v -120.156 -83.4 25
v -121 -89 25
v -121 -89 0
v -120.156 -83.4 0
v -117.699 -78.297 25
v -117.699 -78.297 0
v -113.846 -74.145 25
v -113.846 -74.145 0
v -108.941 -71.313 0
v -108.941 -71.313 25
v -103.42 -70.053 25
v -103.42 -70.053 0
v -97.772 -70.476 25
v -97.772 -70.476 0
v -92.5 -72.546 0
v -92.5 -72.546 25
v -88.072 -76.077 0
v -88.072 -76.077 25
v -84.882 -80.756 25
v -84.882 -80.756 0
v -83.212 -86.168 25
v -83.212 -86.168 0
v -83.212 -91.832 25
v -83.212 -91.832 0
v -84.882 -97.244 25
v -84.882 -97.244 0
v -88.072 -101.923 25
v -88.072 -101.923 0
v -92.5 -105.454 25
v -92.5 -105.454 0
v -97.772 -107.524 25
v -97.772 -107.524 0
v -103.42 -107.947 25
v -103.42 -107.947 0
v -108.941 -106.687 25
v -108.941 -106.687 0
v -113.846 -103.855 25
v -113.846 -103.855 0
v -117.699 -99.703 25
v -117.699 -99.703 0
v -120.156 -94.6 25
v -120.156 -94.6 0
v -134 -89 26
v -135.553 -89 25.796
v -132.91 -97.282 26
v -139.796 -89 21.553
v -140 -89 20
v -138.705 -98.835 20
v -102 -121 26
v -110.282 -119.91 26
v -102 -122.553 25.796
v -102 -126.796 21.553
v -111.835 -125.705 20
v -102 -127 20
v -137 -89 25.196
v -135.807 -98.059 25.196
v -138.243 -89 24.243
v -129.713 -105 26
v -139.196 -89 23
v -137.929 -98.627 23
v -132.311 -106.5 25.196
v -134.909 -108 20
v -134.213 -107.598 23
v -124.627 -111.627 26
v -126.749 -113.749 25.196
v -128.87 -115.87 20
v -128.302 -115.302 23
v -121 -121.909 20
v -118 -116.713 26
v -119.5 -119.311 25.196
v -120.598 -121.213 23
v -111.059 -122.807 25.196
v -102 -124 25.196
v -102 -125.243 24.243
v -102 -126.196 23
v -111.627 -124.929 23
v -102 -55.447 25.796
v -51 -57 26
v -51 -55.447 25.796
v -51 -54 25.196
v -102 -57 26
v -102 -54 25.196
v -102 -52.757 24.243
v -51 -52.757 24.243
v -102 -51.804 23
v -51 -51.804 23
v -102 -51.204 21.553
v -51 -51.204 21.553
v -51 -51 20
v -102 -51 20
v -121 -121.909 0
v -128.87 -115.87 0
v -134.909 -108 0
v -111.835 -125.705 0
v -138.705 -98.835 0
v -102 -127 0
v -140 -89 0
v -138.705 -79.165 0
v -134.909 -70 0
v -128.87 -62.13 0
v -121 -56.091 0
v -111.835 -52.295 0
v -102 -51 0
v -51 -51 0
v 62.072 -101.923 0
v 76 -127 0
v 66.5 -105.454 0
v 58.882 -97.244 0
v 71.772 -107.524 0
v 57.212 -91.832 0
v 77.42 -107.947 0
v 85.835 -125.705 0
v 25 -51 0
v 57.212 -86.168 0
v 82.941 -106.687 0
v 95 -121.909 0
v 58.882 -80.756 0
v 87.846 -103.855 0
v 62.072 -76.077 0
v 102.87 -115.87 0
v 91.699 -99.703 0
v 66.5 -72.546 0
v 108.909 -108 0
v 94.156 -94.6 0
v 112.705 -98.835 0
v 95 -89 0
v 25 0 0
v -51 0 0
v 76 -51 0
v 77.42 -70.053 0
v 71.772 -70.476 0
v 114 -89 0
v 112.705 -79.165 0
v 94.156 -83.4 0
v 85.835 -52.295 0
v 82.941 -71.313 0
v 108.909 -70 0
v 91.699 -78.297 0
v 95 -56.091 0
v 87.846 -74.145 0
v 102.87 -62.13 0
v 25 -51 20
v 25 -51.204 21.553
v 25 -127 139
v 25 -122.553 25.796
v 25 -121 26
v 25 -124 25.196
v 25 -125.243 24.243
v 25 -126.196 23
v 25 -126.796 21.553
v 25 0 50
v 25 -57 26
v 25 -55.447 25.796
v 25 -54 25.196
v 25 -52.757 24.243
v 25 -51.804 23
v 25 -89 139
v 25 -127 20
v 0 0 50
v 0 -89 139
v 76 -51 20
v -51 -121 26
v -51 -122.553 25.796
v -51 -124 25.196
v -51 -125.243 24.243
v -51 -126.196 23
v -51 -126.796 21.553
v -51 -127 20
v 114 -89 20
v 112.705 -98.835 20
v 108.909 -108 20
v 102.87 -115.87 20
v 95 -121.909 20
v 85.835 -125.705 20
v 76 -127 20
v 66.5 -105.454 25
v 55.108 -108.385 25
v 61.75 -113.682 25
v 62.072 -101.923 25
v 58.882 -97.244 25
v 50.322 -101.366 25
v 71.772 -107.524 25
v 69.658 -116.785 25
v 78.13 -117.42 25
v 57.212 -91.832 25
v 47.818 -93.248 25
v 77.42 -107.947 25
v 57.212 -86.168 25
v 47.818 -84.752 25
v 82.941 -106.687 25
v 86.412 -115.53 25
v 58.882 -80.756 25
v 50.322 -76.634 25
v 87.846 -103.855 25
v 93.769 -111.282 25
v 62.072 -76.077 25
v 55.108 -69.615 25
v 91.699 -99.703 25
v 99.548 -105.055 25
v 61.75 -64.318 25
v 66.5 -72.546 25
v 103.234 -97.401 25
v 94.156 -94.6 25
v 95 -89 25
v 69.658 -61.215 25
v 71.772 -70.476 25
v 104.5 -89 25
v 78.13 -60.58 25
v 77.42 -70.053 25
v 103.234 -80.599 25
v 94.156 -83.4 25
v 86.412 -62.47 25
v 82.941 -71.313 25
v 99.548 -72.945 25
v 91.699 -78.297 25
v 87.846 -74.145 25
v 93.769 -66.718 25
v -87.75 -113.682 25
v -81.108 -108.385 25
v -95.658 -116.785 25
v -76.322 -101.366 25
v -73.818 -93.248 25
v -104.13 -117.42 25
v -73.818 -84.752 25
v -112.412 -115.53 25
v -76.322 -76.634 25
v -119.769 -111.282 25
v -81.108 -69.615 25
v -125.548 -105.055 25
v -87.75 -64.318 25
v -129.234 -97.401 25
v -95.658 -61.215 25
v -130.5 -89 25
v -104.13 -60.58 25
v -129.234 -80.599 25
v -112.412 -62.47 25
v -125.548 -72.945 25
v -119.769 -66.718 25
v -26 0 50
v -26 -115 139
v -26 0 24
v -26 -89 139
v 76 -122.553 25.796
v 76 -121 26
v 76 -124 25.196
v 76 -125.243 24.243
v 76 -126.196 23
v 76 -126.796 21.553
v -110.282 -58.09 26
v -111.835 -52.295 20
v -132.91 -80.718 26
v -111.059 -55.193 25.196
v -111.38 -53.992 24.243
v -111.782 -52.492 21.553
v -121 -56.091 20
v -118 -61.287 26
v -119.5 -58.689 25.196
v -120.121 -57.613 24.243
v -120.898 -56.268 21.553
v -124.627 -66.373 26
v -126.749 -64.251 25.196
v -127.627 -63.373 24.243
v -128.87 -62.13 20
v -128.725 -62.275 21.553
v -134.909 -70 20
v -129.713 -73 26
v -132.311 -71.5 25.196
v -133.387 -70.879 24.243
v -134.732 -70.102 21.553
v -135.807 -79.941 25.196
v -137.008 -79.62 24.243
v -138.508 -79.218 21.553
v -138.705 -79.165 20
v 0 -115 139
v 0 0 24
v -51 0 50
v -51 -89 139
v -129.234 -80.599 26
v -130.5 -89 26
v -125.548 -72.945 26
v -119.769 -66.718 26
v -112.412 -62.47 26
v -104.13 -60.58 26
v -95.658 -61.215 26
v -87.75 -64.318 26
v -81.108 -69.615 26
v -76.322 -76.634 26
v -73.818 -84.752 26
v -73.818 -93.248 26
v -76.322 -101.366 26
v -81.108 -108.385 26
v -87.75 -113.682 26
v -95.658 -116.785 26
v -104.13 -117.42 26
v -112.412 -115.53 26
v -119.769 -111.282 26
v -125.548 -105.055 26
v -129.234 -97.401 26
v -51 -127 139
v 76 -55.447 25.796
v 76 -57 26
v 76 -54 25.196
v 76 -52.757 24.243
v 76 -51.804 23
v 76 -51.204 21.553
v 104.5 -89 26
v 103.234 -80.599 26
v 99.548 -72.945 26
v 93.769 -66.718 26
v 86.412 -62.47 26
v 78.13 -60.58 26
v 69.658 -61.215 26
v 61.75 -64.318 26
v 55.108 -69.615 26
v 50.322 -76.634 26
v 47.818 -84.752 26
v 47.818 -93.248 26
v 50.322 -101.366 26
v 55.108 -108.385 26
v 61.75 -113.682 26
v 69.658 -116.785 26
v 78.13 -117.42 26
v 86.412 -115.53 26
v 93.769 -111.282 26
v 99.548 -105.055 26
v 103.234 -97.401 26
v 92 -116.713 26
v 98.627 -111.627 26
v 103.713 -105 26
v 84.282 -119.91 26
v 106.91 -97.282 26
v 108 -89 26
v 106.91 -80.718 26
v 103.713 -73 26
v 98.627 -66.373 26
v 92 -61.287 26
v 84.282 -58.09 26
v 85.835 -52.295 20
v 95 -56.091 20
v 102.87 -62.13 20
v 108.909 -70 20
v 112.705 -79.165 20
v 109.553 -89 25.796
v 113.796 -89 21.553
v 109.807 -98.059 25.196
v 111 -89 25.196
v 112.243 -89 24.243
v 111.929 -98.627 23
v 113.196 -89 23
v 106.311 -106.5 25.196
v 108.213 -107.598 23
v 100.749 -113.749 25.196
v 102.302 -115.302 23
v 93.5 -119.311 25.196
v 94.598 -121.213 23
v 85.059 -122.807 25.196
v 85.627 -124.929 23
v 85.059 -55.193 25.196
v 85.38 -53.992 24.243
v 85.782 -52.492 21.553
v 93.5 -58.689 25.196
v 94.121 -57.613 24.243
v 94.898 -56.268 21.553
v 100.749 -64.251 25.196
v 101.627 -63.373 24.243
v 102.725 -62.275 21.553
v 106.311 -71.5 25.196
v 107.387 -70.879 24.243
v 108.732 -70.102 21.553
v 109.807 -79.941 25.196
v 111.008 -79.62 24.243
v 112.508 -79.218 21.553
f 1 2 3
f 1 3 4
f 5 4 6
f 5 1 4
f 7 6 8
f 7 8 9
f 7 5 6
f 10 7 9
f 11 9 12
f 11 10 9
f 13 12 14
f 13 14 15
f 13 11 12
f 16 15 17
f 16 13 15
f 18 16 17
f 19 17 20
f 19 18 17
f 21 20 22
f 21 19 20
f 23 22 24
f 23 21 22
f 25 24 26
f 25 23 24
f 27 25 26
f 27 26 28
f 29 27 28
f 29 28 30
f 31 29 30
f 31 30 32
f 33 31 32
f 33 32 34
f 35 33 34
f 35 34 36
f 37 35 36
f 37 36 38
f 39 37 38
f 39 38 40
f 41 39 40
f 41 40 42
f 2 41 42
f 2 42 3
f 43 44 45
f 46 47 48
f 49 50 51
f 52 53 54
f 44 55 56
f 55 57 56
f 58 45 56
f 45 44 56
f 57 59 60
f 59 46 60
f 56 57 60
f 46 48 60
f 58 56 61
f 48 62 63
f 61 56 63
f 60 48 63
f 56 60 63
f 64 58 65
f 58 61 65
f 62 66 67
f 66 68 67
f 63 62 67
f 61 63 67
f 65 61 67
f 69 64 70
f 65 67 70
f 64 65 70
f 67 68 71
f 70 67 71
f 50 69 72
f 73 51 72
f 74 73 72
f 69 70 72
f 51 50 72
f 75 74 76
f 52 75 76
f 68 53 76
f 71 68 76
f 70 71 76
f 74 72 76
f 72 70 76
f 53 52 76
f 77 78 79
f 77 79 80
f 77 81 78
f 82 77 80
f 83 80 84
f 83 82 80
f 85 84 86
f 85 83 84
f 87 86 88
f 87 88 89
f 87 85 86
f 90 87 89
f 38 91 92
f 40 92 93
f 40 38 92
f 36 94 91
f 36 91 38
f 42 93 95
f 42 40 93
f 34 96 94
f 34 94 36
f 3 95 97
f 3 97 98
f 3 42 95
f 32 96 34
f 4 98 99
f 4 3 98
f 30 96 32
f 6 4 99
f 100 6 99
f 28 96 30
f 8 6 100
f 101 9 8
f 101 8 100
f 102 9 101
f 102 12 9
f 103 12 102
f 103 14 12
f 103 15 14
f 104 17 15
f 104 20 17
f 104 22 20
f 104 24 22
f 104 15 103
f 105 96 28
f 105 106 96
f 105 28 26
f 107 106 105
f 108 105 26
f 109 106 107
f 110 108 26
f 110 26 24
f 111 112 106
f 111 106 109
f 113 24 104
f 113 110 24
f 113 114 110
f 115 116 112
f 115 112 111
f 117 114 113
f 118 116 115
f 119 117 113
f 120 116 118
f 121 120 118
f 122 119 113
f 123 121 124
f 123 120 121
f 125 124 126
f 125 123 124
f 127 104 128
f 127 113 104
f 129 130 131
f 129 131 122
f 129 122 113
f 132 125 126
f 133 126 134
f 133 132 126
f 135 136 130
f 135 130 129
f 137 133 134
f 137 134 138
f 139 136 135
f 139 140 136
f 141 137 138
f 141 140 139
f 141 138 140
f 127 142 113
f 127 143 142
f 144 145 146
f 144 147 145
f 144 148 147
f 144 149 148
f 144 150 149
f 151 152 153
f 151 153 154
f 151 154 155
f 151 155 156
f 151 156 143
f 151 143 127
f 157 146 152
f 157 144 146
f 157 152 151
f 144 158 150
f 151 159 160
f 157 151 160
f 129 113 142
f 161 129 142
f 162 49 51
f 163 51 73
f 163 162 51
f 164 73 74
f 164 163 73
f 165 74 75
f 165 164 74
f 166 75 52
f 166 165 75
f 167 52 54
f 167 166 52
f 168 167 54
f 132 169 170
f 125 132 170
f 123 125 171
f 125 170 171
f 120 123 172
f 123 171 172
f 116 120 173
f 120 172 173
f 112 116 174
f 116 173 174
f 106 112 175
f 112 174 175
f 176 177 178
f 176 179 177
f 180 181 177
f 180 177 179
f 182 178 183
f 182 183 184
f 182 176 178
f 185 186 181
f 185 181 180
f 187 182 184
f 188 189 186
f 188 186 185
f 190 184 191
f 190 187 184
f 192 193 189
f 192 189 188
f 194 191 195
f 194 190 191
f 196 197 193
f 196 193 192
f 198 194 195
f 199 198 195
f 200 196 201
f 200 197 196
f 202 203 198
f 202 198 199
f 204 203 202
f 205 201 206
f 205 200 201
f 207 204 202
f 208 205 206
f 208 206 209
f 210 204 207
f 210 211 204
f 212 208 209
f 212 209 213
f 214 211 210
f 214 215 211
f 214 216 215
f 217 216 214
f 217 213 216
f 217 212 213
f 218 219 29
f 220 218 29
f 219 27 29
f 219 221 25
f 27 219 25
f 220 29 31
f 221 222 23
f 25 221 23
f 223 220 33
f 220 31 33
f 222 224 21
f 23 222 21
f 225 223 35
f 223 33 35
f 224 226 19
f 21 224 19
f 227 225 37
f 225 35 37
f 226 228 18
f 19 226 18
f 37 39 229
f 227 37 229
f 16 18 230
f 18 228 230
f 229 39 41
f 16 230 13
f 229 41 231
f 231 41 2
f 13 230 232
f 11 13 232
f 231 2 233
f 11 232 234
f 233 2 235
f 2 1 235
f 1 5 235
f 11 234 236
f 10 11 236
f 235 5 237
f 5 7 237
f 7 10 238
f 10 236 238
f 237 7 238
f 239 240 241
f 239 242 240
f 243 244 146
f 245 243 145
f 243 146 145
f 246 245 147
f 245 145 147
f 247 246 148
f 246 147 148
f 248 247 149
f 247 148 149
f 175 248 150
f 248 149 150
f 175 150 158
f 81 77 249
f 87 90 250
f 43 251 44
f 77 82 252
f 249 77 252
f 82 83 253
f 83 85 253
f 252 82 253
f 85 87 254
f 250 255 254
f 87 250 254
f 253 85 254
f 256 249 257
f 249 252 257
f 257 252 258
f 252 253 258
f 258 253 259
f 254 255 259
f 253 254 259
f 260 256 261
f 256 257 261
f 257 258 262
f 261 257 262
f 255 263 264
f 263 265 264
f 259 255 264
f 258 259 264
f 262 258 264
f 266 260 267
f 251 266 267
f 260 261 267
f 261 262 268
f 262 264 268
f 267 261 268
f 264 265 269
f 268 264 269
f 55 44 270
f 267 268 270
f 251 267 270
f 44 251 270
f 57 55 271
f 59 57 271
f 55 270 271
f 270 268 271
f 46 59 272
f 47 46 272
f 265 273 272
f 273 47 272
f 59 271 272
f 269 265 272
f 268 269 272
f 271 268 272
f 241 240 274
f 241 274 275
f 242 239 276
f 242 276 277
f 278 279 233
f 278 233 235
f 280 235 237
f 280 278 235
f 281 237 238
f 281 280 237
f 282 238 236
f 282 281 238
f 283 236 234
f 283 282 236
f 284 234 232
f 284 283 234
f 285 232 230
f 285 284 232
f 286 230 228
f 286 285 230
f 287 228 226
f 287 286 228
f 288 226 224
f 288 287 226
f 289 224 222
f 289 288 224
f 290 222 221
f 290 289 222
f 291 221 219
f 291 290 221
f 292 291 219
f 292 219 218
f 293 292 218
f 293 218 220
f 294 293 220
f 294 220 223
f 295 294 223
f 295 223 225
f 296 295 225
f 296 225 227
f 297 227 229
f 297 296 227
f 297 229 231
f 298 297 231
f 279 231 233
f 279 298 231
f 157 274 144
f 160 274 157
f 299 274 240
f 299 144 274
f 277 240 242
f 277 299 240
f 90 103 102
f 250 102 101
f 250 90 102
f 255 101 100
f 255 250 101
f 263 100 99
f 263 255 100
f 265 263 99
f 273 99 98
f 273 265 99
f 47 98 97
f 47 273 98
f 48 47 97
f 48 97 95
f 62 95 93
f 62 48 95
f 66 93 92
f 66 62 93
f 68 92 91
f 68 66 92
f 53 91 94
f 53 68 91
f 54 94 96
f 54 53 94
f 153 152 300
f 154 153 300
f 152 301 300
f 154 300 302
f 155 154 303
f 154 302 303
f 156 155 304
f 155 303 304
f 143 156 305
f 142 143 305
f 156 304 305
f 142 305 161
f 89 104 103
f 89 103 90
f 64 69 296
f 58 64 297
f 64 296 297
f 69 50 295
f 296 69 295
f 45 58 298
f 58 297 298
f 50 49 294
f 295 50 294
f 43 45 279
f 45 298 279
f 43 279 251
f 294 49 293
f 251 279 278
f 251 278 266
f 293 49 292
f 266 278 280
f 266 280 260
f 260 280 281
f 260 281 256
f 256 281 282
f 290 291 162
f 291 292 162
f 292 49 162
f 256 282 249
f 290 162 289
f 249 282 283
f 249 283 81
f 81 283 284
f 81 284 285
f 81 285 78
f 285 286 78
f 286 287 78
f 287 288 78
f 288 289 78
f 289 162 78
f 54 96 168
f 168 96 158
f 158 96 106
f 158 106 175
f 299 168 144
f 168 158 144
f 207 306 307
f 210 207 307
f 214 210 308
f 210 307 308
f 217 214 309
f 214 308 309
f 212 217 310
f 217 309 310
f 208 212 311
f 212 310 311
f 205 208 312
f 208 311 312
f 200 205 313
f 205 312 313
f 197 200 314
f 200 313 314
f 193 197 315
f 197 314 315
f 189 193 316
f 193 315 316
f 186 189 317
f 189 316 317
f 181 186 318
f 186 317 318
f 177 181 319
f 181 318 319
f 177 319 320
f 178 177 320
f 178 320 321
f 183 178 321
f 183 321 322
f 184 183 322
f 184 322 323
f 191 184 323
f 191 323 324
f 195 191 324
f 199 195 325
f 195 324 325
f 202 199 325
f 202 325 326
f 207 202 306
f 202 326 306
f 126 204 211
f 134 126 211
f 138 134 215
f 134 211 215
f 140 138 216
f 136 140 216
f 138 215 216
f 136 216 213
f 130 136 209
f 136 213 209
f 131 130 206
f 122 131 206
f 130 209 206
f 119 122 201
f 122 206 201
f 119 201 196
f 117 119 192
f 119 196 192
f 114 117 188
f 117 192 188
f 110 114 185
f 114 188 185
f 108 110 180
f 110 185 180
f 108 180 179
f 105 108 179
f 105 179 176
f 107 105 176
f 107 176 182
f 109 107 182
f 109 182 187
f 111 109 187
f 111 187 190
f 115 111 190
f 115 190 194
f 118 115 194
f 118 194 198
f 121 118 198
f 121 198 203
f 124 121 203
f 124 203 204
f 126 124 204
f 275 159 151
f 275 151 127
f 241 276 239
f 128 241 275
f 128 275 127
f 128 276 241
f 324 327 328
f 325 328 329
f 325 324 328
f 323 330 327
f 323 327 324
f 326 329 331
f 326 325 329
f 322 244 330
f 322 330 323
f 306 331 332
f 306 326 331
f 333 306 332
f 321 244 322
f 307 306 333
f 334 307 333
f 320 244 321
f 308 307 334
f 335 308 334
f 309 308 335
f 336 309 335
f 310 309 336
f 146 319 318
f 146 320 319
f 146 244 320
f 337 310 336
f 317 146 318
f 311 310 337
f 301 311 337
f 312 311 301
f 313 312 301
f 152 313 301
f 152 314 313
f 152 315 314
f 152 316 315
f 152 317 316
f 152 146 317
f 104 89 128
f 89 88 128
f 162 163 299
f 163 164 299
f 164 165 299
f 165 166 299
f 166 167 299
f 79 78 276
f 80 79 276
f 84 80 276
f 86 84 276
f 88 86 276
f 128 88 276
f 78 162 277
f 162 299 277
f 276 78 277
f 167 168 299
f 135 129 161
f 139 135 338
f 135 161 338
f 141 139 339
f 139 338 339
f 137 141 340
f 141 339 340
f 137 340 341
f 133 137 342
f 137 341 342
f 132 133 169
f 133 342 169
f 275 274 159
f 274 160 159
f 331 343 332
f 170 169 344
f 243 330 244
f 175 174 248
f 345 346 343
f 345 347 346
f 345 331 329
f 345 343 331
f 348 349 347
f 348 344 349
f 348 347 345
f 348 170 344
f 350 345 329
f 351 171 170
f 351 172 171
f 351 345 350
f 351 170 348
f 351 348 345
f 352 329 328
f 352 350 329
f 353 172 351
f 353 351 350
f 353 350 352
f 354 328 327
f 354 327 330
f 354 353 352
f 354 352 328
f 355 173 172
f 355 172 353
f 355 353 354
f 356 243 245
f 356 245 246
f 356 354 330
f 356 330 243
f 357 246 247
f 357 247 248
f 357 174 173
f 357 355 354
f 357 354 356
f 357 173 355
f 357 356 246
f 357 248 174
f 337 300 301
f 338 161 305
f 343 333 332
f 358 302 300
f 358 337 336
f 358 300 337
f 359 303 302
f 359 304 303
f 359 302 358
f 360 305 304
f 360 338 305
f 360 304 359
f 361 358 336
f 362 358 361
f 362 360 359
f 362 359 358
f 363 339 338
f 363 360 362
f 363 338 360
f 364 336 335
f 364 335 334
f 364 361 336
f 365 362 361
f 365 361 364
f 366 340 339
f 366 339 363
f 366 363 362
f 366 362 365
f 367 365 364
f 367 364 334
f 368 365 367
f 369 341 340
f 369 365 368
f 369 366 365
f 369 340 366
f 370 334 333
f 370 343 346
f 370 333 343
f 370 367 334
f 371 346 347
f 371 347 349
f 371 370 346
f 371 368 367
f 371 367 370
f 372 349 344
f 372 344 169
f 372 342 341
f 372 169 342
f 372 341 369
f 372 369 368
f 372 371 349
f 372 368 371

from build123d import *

# Parameters (mm, degrees)
F1_DEPTH  = 25
F3_DEPTH  = 13
F4_W      = 76
F4_H      = 26
F5_DEPTH  = 89
F7_DEPTH  = 26.001
F9_R      = 19
F10_DEPTH = 26.001
F9_R_2    = 28.5
F11_DEPTH = 1
F12_R     = 6


with BuildPart() as f1:
    # F0 (on Right) → F1 (new body)
    with BuildSketch(Plane.YZ):
        Polygon((-127, 0), (0, 0), (0, 50), (-89, 139), (-127, 139), align=None)
    extrude(amount=F1_DEPTH)

    # F2 (on face) → F3 (join)
    with BuildSketch(Plane(origin=(0, 0, 0), x_dir=(0, -1, 0), z_dir=(-1, 0, 0))):
        Polygon((0, 24), (0, 0), (127, 0), (127, 139), (115, 139), align=None)
    extrude(amount=F3_DEPTH)

    # F4 (on face) → F5 (join)
    with BuildSketch(Plane.YZ.offset(25)):
        with Locations((-89, 13)):
            Rectangle(F4_W, F4_H)
    extrude(amount=F5_DEPTH)

    # F6 (on face) → F7 (cut, through all)
    with BuildSketch(Plane.XY.offset(26)):
        with BuildLine():
            ThreePointArc((76, -51), (102.8700576851, -62.1299423149), (114, -89))
            Line((114, -89), (114, -51))
            Line((114, -51), (76, -51))
        make_face()
        with BuildLine():
            Line((114, -127), (114, -89))
            ThreePointArc((114, -89), (102.8700576851, -115.8700576851), (76, -127))
            Line((76, -127), (114, -127))
        make_face()
    extrude(amount=-F7_DEPTH, mode=Mode.SUBTRACT)

    # F9 (on face) → F10 (cut, through all)
    with BuildSketch(Plane.XY.offset(26)):
        with Locations((76, -89)):
            Circle(F9_R)
    extrude(amount=-F10_DEPTH, mode=Mode.SUBTRACT)

    # F9 (on face) → F11 (cut)
    with BuildSketch(Plane.XY.offset(26)):
        with Locations((76, -89)):
            Circle(F9_R_2)
        with Locations((76, -89)):
            Circle(F9_R, mode=Mode.SUBTRACT)
    extrude(amount=-F11_DEPTH, mode=Mode.SUBTRACT)

    # F12
    f12_edges = [f1.edges().sort_by_distance(p)[0] for p in [
        (50.5, -51, 26),
        (50.5, -127, 26),
        (114, -89, 26),
    ]]
    fillet(f12_edges, radius=F12_R)

    # F13: F1 across plane


with BuildPart() as f1_1:
    add(f1.part)
    add(f1.part.mirror(Plane.YZ.offset(-13)))


solid = f1_1.part
